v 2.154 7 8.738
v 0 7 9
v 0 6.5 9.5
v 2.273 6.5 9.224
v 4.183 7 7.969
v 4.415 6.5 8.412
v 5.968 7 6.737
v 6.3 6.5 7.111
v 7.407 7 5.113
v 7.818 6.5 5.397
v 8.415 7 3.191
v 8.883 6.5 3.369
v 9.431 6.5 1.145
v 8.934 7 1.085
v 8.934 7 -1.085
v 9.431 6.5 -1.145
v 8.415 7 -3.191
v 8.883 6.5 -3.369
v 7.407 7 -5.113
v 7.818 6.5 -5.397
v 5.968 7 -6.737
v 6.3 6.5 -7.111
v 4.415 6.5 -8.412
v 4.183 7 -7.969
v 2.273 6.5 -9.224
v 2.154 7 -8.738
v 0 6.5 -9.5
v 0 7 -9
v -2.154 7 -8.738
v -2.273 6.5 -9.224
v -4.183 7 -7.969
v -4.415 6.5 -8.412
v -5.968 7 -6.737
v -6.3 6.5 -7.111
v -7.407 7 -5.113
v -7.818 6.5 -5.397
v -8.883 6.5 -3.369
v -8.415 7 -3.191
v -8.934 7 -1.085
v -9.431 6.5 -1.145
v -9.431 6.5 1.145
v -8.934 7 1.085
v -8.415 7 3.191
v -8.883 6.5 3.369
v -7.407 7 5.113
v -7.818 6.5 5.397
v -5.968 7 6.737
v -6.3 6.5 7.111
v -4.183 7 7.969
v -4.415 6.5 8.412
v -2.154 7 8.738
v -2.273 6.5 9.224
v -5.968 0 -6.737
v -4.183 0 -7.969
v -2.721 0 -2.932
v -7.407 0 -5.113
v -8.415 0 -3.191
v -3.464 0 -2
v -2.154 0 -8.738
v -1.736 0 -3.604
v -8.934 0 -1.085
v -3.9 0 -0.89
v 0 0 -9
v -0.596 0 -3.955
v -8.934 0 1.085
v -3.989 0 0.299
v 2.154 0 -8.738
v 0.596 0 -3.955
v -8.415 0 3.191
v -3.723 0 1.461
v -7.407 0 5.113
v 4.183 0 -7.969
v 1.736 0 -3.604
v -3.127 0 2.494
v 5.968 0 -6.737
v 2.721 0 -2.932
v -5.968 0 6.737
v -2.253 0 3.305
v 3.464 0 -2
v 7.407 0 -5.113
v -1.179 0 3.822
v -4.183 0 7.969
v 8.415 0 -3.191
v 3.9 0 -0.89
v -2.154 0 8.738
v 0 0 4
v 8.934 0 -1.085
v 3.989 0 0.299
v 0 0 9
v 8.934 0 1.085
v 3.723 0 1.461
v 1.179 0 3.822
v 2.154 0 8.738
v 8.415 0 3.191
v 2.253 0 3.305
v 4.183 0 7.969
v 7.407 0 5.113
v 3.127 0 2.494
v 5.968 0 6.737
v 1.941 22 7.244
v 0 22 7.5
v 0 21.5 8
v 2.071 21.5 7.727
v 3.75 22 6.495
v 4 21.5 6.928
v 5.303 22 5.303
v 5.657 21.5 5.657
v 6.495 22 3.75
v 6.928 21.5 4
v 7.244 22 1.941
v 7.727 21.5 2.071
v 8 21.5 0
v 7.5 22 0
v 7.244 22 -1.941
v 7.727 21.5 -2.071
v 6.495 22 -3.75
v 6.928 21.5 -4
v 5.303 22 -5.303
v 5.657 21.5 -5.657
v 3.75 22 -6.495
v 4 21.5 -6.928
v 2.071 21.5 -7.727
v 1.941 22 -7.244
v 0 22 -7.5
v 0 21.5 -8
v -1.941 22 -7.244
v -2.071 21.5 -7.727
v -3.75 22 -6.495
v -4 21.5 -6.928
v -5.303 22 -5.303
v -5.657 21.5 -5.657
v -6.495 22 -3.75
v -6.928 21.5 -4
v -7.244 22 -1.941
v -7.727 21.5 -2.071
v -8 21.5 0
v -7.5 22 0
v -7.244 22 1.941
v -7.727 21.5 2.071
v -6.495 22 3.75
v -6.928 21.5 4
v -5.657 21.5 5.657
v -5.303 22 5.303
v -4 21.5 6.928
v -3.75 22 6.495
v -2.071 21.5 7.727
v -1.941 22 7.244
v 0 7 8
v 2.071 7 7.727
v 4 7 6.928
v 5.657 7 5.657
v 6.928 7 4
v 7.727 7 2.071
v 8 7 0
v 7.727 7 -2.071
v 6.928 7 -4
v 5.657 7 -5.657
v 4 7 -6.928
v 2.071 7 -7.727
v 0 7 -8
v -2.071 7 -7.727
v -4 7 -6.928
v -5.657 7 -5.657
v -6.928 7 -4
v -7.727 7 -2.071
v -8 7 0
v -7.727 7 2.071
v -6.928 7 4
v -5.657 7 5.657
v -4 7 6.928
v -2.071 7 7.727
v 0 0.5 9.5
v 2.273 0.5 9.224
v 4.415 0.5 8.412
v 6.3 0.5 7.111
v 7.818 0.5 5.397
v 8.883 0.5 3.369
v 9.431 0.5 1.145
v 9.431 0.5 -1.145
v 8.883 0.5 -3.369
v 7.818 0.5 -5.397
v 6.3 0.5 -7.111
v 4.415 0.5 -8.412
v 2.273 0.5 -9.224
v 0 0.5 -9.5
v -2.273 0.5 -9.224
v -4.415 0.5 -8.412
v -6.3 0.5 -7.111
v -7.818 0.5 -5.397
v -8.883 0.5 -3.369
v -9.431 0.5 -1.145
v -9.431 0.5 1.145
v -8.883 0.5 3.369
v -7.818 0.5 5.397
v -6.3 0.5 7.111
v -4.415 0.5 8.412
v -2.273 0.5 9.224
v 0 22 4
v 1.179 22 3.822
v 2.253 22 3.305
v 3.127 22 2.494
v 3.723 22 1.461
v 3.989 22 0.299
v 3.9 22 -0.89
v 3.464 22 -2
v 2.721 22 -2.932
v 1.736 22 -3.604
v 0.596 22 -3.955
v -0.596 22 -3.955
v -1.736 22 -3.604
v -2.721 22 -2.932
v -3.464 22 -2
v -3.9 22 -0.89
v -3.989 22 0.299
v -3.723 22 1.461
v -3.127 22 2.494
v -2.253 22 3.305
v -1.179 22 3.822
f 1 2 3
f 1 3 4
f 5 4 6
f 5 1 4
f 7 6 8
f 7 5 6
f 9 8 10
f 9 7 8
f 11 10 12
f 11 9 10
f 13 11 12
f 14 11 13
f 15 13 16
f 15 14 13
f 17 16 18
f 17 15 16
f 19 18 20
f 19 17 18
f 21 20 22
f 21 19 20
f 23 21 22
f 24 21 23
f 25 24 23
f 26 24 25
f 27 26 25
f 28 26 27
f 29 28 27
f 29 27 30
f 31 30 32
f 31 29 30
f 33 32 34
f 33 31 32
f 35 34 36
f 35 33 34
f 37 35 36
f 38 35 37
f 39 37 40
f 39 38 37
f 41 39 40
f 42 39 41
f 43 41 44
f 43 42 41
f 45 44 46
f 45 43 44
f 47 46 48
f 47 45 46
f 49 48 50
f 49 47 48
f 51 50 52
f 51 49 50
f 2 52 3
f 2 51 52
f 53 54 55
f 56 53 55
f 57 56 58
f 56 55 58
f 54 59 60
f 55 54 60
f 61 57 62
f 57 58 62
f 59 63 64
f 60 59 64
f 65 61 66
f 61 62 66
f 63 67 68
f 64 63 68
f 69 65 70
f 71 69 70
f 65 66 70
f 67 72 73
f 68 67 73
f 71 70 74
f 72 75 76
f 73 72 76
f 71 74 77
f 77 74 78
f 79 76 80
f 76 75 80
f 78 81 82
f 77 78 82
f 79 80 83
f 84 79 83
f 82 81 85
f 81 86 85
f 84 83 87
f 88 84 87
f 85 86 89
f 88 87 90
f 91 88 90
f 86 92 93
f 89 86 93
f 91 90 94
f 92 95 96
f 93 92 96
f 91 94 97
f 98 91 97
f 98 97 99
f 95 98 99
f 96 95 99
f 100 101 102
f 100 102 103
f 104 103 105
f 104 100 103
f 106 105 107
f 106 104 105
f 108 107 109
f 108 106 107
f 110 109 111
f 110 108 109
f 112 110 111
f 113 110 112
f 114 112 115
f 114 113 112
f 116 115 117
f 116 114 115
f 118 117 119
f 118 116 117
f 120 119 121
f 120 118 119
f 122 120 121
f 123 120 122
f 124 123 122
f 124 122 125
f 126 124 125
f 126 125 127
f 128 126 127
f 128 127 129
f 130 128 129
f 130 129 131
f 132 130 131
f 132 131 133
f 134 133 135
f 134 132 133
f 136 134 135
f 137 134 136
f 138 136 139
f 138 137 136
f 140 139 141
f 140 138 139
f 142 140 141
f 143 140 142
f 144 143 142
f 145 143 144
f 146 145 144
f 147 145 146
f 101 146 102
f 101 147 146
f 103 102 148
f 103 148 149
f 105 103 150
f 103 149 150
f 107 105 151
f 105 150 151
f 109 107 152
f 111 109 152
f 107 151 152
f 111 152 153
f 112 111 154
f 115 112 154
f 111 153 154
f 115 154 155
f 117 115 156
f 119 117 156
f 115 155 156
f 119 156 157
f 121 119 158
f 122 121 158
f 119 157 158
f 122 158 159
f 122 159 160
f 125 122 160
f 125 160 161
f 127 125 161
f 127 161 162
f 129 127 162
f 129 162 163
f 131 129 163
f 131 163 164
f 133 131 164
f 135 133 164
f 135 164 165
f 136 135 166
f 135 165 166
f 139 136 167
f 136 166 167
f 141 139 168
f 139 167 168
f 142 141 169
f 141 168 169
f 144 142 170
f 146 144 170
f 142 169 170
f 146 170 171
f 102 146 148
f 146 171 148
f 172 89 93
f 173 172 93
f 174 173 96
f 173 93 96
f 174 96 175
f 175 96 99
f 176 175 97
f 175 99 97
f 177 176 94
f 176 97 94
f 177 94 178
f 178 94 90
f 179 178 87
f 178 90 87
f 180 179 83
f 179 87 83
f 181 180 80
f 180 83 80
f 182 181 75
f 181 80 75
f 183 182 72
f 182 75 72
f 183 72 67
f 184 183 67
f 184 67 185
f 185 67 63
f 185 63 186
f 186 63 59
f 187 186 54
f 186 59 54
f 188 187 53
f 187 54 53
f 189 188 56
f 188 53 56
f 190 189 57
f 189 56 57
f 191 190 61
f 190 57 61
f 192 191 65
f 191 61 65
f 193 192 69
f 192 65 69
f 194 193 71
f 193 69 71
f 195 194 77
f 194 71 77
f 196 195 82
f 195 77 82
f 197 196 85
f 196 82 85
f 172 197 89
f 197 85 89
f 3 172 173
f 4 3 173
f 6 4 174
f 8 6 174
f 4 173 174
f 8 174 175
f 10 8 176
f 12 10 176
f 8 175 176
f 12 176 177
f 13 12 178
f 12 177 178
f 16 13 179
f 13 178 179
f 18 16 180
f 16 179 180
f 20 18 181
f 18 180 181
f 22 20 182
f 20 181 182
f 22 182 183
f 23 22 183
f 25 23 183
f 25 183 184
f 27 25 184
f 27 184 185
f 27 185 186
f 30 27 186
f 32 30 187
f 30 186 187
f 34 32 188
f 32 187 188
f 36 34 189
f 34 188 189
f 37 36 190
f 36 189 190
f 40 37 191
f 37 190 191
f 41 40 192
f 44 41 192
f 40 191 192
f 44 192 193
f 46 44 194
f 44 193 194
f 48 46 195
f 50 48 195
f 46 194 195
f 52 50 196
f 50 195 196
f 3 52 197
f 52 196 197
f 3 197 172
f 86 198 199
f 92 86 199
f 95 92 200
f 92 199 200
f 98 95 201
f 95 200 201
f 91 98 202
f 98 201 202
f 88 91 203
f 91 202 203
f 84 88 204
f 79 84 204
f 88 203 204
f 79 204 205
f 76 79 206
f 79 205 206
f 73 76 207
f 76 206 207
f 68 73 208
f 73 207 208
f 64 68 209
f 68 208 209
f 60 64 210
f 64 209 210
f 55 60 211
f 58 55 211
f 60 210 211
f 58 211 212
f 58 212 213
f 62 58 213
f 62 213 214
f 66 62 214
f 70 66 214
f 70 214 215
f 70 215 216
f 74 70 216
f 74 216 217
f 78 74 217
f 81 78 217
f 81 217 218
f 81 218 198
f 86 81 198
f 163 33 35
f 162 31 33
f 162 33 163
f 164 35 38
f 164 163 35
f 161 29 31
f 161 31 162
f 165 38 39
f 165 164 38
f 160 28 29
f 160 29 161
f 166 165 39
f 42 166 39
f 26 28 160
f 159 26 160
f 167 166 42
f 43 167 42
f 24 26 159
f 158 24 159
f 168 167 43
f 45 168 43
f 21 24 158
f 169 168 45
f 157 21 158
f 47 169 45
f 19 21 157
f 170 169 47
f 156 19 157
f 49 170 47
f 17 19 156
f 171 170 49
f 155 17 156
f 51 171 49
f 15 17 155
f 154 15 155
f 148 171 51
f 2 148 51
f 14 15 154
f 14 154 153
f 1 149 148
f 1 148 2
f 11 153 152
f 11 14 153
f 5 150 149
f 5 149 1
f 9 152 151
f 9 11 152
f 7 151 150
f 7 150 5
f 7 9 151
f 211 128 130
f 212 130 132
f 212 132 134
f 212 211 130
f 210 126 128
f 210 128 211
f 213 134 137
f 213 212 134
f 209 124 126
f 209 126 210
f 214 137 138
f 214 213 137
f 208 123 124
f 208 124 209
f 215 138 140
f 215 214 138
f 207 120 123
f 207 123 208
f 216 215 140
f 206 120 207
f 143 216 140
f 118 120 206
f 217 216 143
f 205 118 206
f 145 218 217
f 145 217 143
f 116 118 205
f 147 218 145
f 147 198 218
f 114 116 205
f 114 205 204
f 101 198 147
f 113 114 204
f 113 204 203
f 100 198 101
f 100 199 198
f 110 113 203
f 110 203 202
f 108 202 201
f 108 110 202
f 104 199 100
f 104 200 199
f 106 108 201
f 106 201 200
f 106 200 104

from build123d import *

# Parameters (mm, degrees)
SKETCH1_R           = 9.5
BOSS_EXTRUDE1_DEPTH = 7
SKETCH2_R           = 8
BOSS_EXTRUDE2_DEPTH = 15
SKETCH3_R           = 4
CUT_EXTRUDE1_DEPTH  = 26.777897509
CHAMFER1_SIZE       = 0.5


with BuildPart() as part:
    # Sketch1 → Boss-Extrude1 (new body)
    with BuildSketch(Plane(origin=(0, 0, 0), x_dir=(1, 0, 0), z_dir=(0, 1, 0))):
        with Locations(Location((0, 0, 0), (0, 0, 270))):
            Circle(SKETCH1_R)
    extrude(amount=BOSS_EXTRUDE1_DEPTH)

    # Sketch2 → Boss-Extrude2 (add)
    with BuildSketch(Plane(origin=(0, 7, 0), x_dir=(1, 0, 0), z_dir=(0, 1, 0))):
        with Locations(Location((0, 0, 0), (0, 0, 270))):
            Circle(SKETCH2_R)
    extrude(amount=BOSS_EXTRUDE2_DEPTH)

    # Sketch3 → Cut-Extrude1 (cut, through all)
    with BuildSketch(Plane(origin=(0, 22, 0), x_dir=(1, 0, 0), z_dir=(0, 1, 0))):
        with Locations(Location((0, 0, 0), (0, 0, 270))):
            Circle(SKETCH3_R)
    extrude(amount=-CUT_EXTRUDE1_DEPTH, mode=Mode.SUBTRACT)

    # Chamfer1
    chamfer1_edges = [part.edges().sort_by_distance(p)[0] for p in [
        (0, 0, -9.5),
        (0, 7, -9.5),
        (0, 22, -8),
    ]]
    chamfer(chamfer1_edges, length=CHAMFER1_SIZE)


solid = part.part
